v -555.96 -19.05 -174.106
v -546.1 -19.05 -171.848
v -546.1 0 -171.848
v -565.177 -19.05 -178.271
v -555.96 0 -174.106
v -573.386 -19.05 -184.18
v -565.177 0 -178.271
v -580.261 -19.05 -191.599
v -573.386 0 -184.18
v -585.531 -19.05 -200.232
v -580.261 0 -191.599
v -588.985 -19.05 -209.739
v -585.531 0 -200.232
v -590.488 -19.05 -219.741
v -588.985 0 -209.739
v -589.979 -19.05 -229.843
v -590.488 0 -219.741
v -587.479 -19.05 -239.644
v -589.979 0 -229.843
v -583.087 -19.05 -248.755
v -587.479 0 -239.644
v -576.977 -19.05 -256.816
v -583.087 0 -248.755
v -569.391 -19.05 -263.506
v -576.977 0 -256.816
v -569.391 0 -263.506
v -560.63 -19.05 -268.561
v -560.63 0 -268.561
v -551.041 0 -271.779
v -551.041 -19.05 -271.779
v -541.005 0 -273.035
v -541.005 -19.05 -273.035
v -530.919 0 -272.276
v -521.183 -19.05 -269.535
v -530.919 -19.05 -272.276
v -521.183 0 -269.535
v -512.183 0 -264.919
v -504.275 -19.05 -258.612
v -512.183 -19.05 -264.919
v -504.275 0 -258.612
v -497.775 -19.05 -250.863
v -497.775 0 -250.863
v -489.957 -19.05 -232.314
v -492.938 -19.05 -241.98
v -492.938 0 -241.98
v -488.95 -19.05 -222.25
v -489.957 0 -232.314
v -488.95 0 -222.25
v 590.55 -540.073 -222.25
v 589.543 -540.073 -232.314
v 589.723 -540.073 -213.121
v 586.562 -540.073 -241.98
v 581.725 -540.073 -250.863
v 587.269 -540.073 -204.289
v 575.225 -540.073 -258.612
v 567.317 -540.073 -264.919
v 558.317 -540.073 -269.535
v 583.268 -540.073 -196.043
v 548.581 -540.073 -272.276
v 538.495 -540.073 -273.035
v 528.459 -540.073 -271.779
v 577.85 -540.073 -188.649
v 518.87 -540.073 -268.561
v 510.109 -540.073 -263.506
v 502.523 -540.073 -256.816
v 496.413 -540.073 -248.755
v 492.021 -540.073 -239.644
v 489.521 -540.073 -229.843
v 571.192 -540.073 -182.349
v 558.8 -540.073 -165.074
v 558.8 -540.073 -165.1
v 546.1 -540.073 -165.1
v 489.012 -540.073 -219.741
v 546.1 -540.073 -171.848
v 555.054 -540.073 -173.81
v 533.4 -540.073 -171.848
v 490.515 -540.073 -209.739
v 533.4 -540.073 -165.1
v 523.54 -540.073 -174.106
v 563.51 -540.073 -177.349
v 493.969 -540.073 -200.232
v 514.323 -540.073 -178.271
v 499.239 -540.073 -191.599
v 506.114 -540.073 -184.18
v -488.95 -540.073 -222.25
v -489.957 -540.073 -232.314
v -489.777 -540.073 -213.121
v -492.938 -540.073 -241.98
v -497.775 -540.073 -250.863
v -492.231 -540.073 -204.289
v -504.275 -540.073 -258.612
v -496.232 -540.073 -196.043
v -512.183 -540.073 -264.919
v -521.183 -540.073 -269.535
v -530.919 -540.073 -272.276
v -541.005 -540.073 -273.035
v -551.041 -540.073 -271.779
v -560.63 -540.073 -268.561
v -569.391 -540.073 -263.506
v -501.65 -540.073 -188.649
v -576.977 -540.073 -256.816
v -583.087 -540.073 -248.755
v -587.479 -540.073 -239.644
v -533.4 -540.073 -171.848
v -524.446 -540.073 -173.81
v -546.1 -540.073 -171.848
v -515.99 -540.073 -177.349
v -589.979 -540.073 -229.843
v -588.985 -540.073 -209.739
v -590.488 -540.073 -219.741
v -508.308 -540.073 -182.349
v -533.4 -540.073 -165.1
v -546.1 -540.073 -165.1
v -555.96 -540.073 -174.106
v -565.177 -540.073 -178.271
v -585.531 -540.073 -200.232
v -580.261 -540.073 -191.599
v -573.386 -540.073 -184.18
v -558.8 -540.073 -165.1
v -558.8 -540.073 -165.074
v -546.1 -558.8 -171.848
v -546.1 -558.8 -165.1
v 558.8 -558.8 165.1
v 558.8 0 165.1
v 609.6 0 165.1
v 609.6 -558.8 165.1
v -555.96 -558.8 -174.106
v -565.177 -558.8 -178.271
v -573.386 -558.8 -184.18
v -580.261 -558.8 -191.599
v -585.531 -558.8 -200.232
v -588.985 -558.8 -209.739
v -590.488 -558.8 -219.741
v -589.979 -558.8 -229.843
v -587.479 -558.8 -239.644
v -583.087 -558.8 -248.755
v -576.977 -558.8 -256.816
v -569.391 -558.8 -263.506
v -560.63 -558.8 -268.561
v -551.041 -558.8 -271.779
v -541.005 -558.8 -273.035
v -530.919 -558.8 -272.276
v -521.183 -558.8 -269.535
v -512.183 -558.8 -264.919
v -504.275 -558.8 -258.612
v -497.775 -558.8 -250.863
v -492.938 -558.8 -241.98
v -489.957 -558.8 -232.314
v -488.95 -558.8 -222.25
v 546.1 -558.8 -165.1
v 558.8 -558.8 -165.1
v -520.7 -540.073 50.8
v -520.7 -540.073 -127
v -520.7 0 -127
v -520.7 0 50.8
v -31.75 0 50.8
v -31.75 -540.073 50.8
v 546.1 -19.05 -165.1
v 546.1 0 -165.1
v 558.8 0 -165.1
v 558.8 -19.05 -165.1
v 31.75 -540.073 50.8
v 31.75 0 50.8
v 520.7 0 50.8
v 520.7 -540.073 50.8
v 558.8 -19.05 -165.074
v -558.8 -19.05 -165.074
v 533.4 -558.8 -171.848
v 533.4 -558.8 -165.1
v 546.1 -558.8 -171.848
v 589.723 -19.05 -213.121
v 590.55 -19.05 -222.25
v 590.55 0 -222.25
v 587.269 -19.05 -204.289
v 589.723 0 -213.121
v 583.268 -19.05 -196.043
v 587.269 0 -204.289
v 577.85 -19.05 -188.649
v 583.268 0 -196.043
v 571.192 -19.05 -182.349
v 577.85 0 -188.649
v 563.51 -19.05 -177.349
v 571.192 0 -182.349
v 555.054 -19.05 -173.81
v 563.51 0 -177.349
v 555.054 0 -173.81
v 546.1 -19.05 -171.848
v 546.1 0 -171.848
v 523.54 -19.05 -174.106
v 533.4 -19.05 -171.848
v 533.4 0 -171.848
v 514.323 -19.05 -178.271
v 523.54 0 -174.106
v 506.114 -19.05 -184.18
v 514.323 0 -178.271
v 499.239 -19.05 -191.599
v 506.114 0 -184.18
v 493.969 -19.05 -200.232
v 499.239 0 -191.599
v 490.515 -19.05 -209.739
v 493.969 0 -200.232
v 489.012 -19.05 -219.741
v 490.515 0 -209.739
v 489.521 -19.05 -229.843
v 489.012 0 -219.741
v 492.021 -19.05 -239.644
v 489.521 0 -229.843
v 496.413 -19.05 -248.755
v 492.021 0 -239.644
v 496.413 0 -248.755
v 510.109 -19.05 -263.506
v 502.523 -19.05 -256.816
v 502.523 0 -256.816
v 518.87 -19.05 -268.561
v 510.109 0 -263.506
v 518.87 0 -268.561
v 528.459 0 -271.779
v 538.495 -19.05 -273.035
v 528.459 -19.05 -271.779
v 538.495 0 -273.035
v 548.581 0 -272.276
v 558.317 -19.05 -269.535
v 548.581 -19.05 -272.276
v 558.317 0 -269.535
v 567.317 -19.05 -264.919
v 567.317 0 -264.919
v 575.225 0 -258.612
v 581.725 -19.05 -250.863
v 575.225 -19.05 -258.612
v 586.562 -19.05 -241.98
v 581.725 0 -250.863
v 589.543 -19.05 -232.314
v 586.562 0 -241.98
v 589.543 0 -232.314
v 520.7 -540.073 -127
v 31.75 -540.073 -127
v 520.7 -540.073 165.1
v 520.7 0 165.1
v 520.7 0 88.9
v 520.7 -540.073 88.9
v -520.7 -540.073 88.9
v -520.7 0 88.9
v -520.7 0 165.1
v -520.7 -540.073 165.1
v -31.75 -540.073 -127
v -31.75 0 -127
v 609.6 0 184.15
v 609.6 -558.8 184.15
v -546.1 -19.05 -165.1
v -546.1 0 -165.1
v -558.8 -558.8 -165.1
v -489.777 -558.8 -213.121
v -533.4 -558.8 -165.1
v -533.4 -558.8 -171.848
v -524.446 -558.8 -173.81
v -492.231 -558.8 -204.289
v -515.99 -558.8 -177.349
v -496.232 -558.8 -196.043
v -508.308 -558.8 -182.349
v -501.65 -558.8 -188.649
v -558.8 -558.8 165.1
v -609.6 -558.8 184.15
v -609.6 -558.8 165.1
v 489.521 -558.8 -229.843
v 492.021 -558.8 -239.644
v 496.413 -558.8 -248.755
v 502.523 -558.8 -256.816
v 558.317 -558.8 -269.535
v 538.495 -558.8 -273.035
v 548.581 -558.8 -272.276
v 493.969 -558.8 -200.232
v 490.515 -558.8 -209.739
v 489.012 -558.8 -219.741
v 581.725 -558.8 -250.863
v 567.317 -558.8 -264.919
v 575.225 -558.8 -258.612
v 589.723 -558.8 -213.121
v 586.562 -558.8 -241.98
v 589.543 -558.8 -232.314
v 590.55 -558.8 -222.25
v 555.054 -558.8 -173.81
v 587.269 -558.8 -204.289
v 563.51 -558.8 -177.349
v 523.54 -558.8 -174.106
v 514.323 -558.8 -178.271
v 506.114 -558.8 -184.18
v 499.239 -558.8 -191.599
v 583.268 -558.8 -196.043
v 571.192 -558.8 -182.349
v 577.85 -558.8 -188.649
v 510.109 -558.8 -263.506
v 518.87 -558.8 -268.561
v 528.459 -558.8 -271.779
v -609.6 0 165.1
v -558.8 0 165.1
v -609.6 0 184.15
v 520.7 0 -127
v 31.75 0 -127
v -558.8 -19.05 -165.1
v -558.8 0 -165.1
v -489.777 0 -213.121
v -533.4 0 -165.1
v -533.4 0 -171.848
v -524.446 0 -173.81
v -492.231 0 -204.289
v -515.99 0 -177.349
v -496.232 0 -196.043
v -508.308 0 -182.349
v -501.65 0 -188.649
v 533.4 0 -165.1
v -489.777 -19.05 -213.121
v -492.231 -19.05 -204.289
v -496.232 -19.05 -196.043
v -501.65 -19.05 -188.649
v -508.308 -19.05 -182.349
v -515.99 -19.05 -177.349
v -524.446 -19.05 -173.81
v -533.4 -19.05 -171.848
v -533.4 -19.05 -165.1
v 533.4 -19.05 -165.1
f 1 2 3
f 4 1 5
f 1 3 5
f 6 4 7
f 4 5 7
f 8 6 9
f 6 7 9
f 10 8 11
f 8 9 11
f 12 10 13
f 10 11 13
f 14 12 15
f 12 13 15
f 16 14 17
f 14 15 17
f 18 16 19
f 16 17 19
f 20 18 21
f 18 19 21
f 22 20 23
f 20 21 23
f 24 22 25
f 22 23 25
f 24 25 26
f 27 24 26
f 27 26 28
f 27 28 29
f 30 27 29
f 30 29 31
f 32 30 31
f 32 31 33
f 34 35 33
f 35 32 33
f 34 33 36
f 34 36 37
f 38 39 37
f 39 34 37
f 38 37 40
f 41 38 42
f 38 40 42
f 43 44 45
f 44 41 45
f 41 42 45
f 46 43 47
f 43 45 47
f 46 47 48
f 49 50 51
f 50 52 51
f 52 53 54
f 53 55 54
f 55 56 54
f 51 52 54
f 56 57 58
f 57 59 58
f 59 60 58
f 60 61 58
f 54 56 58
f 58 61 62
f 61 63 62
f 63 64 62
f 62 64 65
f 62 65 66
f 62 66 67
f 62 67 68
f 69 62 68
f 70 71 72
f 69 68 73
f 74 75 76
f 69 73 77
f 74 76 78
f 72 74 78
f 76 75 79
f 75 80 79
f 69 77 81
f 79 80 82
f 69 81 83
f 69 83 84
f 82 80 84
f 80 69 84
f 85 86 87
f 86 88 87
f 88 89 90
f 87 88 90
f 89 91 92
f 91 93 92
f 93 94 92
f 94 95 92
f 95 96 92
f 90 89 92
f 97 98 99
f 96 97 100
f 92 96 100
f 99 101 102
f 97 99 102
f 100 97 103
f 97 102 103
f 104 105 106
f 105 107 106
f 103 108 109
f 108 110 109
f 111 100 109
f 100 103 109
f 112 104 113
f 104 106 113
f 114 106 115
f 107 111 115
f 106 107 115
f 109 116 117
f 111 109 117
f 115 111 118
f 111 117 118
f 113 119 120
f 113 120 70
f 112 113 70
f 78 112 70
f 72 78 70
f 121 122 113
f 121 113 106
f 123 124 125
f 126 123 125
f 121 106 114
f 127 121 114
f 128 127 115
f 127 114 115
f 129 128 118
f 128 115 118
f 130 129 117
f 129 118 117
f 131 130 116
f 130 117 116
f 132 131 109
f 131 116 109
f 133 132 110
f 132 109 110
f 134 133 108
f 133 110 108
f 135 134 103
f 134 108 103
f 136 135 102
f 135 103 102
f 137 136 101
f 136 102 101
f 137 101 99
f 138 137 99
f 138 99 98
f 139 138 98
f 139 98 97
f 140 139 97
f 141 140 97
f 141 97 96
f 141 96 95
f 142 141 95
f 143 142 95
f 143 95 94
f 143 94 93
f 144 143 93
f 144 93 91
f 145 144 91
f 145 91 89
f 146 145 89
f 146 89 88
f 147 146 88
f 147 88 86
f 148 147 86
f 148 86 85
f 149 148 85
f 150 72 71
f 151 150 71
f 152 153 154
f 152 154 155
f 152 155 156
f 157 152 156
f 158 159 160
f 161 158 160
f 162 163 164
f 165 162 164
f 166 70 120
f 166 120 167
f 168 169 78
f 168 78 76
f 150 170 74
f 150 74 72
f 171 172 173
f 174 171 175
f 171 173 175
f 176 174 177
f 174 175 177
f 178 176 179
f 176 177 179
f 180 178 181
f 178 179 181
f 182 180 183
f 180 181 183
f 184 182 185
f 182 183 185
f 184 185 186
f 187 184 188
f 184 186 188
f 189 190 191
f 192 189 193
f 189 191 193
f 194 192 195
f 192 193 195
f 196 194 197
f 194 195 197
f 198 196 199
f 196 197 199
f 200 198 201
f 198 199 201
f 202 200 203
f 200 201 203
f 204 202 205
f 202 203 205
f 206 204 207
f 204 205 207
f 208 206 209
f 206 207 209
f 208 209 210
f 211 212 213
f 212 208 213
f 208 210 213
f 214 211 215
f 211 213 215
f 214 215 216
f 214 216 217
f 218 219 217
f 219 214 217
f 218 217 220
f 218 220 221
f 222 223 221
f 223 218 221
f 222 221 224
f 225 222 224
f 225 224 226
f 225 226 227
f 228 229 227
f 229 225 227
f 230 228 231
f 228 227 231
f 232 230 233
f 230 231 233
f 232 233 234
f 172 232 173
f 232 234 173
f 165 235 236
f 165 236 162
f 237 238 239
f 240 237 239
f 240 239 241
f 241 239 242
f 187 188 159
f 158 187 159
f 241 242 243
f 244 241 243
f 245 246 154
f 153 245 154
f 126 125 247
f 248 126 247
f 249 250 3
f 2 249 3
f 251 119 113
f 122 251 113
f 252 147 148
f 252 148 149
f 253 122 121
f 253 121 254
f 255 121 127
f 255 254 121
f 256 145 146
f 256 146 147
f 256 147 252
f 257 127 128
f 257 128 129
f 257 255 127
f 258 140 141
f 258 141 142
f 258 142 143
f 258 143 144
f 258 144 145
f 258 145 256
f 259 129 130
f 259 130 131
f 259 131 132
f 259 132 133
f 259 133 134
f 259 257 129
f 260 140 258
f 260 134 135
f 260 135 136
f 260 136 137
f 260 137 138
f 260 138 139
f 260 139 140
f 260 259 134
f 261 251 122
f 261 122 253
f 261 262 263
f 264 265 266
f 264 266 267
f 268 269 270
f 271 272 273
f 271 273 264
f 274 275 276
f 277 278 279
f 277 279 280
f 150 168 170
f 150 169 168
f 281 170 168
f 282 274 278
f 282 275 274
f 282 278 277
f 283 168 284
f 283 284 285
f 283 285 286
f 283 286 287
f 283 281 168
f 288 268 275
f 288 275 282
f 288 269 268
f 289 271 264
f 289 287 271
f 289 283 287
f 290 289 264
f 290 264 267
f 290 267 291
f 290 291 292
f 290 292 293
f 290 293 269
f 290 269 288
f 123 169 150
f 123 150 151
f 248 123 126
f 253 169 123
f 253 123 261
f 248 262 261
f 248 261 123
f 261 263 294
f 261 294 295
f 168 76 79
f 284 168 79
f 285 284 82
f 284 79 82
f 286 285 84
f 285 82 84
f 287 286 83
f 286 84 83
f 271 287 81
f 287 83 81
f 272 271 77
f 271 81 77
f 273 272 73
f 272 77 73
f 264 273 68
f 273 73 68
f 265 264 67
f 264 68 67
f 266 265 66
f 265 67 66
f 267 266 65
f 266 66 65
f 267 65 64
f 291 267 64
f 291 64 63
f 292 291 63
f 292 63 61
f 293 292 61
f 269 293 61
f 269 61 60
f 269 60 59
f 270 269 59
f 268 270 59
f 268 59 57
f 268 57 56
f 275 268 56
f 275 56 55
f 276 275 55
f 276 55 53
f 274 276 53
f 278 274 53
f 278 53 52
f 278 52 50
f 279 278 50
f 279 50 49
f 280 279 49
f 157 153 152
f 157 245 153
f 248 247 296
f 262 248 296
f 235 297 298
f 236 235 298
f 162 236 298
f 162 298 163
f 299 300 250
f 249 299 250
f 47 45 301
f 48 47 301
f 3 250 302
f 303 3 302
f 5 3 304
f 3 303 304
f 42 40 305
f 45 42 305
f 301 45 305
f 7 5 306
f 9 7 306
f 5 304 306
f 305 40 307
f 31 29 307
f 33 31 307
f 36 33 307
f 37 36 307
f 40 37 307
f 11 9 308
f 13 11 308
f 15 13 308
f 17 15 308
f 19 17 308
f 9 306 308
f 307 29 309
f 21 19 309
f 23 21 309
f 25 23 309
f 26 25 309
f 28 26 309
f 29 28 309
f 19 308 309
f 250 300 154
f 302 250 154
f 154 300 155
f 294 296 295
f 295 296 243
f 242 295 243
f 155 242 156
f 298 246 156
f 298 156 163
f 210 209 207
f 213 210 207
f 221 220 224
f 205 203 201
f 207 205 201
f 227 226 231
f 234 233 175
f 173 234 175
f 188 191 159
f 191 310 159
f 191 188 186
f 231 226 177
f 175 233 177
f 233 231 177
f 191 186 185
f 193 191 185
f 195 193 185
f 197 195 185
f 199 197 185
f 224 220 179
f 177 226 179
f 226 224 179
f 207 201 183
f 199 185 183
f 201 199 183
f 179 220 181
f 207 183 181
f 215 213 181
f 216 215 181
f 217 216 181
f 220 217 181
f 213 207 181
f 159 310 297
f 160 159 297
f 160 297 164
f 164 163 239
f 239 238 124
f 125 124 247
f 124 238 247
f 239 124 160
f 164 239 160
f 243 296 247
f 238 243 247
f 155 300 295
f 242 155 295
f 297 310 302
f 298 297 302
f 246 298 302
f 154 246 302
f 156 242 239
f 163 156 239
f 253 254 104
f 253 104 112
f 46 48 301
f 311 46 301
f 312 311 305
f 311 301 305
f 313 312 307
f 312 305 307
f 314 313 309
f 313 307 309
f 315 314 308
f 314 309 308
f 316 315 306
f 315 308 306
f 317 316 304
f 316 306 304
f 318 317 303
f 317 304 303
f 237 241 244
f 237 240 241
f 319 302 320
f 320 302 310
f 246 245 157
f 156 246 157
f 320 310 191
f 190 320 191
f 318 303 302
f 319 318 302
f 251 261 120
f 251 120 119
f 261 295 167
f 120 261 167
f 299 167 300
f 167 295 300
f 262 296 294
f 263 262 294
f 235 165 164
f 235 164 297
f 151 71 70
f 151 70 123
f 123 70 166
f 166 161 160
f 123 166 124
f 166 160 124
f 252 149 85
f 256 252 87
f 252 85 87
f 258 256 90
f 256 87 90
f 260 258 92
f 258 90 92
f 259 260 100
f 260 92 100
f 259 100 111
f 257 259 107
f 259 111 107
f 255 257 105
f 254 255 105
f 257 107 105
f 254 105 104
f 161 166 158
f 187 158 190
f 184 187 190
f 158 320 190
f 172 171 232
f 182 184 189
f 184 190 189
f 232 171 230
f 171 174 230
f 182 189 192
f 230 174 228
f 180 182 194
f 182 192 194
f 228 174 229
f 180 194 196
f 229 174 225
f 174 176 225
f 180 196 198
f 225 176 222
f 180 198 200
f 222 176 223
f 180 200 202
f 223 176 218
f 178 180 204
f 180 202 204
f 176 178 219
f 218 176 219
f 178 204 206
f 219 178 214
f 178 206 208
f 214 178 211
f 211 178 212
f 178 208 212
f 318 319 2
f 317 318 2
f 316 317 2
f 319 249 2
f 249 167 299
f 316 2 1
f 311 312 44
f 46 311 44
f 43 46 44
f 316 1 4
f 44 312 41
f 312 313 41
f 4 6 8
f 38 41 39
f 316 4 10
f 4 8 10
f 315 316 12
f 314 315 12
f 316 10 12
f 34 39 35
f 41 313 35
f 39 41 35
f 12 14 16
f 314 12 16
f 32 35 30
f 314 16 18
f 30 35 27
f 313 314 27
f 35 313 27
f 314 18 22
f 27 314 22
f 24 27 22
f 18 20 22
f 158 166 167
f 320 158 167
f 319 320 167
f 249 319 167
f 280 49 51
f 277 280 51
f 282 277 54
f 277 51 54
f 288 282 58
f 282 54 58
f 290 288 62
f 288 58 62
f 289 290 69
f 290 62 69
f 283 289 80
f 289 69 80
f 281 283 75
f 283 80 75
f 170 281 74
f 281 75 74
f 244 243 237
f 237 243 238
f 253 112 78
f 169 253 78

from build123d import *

# Parameters (mm, degrees)
F0_W     = 63.5
F0_H     = 177.8
F1_DEPTH = 558.8
F4_DEPTH = 1412.24
F5_W     = 18.7272608757
F5_H     = 330.1743186474
F6_DEPTH = 1117.6


with BuildPart() as f1:
    # F0 (on Front) → F1 (new body)
    with BuildSketch(Plane.XZ):
        Polygon((-539.75, -165.1), (-533.4, -165.1), (-533.4, -148.0671259786), (-546.1, -148.0671259786), (-546.1, -165.1), align=None)
        Polygon((31.75, 50.8), (520.7, 50.8), (520.7, 88.9), (-520.7, 88.9), (-520.7, 50.8), (-31.75, 50.8), align=None)
        Polygon((-520.7, 165.1), (520.7, 165.1), (558.8, 165.1), (609.6, 165.1), (609.6, 184.15), (-609.6, 184.15), (-609.6, 165.1), (-558.8, 165.1), align=None)
        Polygon((533.4, -148.0671259786), (533.4, -165.1), (539.75, -165.1), (546.1, -165.1), (546.1, -148.0671259786), align=None)
        Polygon((-520.7, -165.1), (520.7, -165.1), (520.7, -127), (31.75, -127), (-31.75, -127), (-520.7, -127), align=None)
        with Locations((0, -38.1)):
            Rectangle(F0_W, F0_H)
        Polygon((520.7, -127), (520.7, -165.1), (533.4, -165.1), (533.4, -148.0671259786), (546.1, -148.0671259786), (546.1, -165.1), (558.8, -165.1), (558.8, 165.1), (520.7, 165.1), (520.7, 88.9), (520.7, 50.8), align=None)
        Polygon((-533.4, -165.1), (-520.7, -165.1), (-520.7, -127), (-520.7, 50.8), (-520.7, 88.9), (-520.7, 165.1), (-558.8, 165.1), (-558.8, -165.1), (-546.1, -165.1), (-546.1, -148.0671259786), (-533.4, -148.0671259786), align=None)
        with BuildLine():
            Line((-539.75, -171.45), (-539.75, -165.1))
            Line((-539.75, -165.1), (-546.1, -165.1))
            Line((-546.1, -165.1), (-546.1, -171.8484375242))
            ThreePointArc((-546.1, -171.8484375242), (-542.9312439572, -171.5497072308), (-539.75, -171.45))
        make_face()
        with BuildLine():
            Line((-533.4, -171.8484375242), (-533.4, -165.1))
            Line((-533.4, -165.1), (-539.75, -165.1))
            Line((-539.75, -165.1), (-539.75, -171.45))
            ThreePointArc((-539.75, -171.45), (-536.5687560428, -171.5497072308), (-533.4, -171.8484375242))
        make_face()
        with BuildLine():
            Line((-533.4, -182.1328740214), (-533.4, -171.8484375242))
            ThreePointArc((-533.4, -171.8484375242), (-536.5687560428, -171.5497072308), (-539.75, -171.45))
            Line((-539.75, -171.45), (-539.75, -182.1328740214))
            Line((-539.75, -182.1328740214), (-533.4, -182.1328740214))
        make_face()
        with BuildLine():
            Line((-539.75, -182.1328740214), (-539.75, -171.45))
            ThreePointArc((-539.75, -171.45), (-542.9312439572, -171.5497072308), (-546.1, -171.8484375242))
            Line((-546.1, -171.8484375242), (-546.1, -182.1328740214))
            Line((-546.1, -182.1328740214), (-539.75, -182.1328740214))
        make_face()
        with BuildLine():
            ThreePointArc((-488.95, -222.25), (-501.65, -188.6489583495), (-533.4, -171.8484375242))
            Line((-533.4, -171.8484375242), (-533.4, -182.1328740214))
            Line((-533.4, -182.1328740214), (-539.75, -182.1328740214))
            Line((-539.75, -182.1328740214), (-546.1, -182.1328740214))
            Line((-546.1, -182.1328740214), (-546.1, -171.8484375242))
            ThreePointArc((-546.1, -171.8484375242), (-573.3510416505, -260.35), (-488.95, -222.25))
        make_face()
        with BuildLine():
            Line((539.75, -165.1), (533.4, -165.1))
            Line((533.4, -165.1), (533.4, -171.8484375242))
            ThreePointArc((533.4, -171.8484375242), (536.5687560428, -171.5497072308), (539.75, -171.45))
            Line((539.75, -171.45), (539.75, -165.1))
        make_face()
        with BuildLine():
            ThreePointArc((539.75, -171.45), (536.5687560428, -171.5497072308), (533.4, -171.8484375242))
            Line((533.4, -171.8484375242), (533.4, -182.1328740214))
            Line((533.4, -182.1328740214), (539.75, -182.1328740214))
            Line((539.75, -182.1328740214), (539.75, -171.45))
        make_face()
        with BuildLine():
            Line((546.1, -165.1), (539.75, -165.1))
            Line((539.75, -165.1), (539.75, -171.45))
            ThreePointArc((539.75, -171.45), (542.9312439572, -171.5497072308), (546.1, -171.8484375242))
            Line((546.1, -171.8484375242), (546.1, -165.1))
        make_face()
        with BuildLine():
            ThreePointArc((546.1, -171.8484375242), (542.9312439572, -171.5497072308), (539.75, -171.45))
            Line((539.75, -171.45), (539.75, -182.1328740214))
            Line((539.75, -182.1328740214), (546.1, -182.1328740214))
            Line((546.1, -182.1328740214), (546.1, -171.8484375242))
        make_face()
        with BuildLine():
            Line((533.4, -182.1328740214), (533.4, -171.8484375242))
            ThreePointArc((533.4, -171.8484375242), (506.1489583495, -260.35), (590.55, -222.25))
            ThreePointArc((590.55, -222.25), (577.85, -188.6489583495), (546.1, -171.8484375242))
            Line((546.1, -171.8484375242), (546.1, -182.1328740214))
            Line((546.1, -182.1328740214), (539.75, -182.1328740214))
            Line((539.75, -182.1328740214), (533.4, -182.1328740214))
        make_face()
    extrude(amount=F1_DEPTH)

    # F3 (on offset) → F4 (cut)
    with BuildSketch(Plane(origin=(-762, 0, 0), x_dir=(0, -1, 0), z_dir=(-1, 0, 0))):
        Polygon((540.0727391243, -165.0743186474), (19.05, -165.0743186474), (19.05, -171.5670526028), (19.05, -304.82172966), (540.0727391243, -304.82172966), (540.0727391243, -173.7104952335), align=None)
    extrude(amount=-F4_DEPTH, mode=Mode.SUBTRACT)

    # F5 (on face) → F6 (join)
    with BuildSketch(Plane.YZ.offset(558.8)):
        with Locations((-549.4363695621, 0.0128406763)):
            Rectangle(F5_W, F5_H)
    extrude(amount=-F6_DEPTH)


solid = f1.part
